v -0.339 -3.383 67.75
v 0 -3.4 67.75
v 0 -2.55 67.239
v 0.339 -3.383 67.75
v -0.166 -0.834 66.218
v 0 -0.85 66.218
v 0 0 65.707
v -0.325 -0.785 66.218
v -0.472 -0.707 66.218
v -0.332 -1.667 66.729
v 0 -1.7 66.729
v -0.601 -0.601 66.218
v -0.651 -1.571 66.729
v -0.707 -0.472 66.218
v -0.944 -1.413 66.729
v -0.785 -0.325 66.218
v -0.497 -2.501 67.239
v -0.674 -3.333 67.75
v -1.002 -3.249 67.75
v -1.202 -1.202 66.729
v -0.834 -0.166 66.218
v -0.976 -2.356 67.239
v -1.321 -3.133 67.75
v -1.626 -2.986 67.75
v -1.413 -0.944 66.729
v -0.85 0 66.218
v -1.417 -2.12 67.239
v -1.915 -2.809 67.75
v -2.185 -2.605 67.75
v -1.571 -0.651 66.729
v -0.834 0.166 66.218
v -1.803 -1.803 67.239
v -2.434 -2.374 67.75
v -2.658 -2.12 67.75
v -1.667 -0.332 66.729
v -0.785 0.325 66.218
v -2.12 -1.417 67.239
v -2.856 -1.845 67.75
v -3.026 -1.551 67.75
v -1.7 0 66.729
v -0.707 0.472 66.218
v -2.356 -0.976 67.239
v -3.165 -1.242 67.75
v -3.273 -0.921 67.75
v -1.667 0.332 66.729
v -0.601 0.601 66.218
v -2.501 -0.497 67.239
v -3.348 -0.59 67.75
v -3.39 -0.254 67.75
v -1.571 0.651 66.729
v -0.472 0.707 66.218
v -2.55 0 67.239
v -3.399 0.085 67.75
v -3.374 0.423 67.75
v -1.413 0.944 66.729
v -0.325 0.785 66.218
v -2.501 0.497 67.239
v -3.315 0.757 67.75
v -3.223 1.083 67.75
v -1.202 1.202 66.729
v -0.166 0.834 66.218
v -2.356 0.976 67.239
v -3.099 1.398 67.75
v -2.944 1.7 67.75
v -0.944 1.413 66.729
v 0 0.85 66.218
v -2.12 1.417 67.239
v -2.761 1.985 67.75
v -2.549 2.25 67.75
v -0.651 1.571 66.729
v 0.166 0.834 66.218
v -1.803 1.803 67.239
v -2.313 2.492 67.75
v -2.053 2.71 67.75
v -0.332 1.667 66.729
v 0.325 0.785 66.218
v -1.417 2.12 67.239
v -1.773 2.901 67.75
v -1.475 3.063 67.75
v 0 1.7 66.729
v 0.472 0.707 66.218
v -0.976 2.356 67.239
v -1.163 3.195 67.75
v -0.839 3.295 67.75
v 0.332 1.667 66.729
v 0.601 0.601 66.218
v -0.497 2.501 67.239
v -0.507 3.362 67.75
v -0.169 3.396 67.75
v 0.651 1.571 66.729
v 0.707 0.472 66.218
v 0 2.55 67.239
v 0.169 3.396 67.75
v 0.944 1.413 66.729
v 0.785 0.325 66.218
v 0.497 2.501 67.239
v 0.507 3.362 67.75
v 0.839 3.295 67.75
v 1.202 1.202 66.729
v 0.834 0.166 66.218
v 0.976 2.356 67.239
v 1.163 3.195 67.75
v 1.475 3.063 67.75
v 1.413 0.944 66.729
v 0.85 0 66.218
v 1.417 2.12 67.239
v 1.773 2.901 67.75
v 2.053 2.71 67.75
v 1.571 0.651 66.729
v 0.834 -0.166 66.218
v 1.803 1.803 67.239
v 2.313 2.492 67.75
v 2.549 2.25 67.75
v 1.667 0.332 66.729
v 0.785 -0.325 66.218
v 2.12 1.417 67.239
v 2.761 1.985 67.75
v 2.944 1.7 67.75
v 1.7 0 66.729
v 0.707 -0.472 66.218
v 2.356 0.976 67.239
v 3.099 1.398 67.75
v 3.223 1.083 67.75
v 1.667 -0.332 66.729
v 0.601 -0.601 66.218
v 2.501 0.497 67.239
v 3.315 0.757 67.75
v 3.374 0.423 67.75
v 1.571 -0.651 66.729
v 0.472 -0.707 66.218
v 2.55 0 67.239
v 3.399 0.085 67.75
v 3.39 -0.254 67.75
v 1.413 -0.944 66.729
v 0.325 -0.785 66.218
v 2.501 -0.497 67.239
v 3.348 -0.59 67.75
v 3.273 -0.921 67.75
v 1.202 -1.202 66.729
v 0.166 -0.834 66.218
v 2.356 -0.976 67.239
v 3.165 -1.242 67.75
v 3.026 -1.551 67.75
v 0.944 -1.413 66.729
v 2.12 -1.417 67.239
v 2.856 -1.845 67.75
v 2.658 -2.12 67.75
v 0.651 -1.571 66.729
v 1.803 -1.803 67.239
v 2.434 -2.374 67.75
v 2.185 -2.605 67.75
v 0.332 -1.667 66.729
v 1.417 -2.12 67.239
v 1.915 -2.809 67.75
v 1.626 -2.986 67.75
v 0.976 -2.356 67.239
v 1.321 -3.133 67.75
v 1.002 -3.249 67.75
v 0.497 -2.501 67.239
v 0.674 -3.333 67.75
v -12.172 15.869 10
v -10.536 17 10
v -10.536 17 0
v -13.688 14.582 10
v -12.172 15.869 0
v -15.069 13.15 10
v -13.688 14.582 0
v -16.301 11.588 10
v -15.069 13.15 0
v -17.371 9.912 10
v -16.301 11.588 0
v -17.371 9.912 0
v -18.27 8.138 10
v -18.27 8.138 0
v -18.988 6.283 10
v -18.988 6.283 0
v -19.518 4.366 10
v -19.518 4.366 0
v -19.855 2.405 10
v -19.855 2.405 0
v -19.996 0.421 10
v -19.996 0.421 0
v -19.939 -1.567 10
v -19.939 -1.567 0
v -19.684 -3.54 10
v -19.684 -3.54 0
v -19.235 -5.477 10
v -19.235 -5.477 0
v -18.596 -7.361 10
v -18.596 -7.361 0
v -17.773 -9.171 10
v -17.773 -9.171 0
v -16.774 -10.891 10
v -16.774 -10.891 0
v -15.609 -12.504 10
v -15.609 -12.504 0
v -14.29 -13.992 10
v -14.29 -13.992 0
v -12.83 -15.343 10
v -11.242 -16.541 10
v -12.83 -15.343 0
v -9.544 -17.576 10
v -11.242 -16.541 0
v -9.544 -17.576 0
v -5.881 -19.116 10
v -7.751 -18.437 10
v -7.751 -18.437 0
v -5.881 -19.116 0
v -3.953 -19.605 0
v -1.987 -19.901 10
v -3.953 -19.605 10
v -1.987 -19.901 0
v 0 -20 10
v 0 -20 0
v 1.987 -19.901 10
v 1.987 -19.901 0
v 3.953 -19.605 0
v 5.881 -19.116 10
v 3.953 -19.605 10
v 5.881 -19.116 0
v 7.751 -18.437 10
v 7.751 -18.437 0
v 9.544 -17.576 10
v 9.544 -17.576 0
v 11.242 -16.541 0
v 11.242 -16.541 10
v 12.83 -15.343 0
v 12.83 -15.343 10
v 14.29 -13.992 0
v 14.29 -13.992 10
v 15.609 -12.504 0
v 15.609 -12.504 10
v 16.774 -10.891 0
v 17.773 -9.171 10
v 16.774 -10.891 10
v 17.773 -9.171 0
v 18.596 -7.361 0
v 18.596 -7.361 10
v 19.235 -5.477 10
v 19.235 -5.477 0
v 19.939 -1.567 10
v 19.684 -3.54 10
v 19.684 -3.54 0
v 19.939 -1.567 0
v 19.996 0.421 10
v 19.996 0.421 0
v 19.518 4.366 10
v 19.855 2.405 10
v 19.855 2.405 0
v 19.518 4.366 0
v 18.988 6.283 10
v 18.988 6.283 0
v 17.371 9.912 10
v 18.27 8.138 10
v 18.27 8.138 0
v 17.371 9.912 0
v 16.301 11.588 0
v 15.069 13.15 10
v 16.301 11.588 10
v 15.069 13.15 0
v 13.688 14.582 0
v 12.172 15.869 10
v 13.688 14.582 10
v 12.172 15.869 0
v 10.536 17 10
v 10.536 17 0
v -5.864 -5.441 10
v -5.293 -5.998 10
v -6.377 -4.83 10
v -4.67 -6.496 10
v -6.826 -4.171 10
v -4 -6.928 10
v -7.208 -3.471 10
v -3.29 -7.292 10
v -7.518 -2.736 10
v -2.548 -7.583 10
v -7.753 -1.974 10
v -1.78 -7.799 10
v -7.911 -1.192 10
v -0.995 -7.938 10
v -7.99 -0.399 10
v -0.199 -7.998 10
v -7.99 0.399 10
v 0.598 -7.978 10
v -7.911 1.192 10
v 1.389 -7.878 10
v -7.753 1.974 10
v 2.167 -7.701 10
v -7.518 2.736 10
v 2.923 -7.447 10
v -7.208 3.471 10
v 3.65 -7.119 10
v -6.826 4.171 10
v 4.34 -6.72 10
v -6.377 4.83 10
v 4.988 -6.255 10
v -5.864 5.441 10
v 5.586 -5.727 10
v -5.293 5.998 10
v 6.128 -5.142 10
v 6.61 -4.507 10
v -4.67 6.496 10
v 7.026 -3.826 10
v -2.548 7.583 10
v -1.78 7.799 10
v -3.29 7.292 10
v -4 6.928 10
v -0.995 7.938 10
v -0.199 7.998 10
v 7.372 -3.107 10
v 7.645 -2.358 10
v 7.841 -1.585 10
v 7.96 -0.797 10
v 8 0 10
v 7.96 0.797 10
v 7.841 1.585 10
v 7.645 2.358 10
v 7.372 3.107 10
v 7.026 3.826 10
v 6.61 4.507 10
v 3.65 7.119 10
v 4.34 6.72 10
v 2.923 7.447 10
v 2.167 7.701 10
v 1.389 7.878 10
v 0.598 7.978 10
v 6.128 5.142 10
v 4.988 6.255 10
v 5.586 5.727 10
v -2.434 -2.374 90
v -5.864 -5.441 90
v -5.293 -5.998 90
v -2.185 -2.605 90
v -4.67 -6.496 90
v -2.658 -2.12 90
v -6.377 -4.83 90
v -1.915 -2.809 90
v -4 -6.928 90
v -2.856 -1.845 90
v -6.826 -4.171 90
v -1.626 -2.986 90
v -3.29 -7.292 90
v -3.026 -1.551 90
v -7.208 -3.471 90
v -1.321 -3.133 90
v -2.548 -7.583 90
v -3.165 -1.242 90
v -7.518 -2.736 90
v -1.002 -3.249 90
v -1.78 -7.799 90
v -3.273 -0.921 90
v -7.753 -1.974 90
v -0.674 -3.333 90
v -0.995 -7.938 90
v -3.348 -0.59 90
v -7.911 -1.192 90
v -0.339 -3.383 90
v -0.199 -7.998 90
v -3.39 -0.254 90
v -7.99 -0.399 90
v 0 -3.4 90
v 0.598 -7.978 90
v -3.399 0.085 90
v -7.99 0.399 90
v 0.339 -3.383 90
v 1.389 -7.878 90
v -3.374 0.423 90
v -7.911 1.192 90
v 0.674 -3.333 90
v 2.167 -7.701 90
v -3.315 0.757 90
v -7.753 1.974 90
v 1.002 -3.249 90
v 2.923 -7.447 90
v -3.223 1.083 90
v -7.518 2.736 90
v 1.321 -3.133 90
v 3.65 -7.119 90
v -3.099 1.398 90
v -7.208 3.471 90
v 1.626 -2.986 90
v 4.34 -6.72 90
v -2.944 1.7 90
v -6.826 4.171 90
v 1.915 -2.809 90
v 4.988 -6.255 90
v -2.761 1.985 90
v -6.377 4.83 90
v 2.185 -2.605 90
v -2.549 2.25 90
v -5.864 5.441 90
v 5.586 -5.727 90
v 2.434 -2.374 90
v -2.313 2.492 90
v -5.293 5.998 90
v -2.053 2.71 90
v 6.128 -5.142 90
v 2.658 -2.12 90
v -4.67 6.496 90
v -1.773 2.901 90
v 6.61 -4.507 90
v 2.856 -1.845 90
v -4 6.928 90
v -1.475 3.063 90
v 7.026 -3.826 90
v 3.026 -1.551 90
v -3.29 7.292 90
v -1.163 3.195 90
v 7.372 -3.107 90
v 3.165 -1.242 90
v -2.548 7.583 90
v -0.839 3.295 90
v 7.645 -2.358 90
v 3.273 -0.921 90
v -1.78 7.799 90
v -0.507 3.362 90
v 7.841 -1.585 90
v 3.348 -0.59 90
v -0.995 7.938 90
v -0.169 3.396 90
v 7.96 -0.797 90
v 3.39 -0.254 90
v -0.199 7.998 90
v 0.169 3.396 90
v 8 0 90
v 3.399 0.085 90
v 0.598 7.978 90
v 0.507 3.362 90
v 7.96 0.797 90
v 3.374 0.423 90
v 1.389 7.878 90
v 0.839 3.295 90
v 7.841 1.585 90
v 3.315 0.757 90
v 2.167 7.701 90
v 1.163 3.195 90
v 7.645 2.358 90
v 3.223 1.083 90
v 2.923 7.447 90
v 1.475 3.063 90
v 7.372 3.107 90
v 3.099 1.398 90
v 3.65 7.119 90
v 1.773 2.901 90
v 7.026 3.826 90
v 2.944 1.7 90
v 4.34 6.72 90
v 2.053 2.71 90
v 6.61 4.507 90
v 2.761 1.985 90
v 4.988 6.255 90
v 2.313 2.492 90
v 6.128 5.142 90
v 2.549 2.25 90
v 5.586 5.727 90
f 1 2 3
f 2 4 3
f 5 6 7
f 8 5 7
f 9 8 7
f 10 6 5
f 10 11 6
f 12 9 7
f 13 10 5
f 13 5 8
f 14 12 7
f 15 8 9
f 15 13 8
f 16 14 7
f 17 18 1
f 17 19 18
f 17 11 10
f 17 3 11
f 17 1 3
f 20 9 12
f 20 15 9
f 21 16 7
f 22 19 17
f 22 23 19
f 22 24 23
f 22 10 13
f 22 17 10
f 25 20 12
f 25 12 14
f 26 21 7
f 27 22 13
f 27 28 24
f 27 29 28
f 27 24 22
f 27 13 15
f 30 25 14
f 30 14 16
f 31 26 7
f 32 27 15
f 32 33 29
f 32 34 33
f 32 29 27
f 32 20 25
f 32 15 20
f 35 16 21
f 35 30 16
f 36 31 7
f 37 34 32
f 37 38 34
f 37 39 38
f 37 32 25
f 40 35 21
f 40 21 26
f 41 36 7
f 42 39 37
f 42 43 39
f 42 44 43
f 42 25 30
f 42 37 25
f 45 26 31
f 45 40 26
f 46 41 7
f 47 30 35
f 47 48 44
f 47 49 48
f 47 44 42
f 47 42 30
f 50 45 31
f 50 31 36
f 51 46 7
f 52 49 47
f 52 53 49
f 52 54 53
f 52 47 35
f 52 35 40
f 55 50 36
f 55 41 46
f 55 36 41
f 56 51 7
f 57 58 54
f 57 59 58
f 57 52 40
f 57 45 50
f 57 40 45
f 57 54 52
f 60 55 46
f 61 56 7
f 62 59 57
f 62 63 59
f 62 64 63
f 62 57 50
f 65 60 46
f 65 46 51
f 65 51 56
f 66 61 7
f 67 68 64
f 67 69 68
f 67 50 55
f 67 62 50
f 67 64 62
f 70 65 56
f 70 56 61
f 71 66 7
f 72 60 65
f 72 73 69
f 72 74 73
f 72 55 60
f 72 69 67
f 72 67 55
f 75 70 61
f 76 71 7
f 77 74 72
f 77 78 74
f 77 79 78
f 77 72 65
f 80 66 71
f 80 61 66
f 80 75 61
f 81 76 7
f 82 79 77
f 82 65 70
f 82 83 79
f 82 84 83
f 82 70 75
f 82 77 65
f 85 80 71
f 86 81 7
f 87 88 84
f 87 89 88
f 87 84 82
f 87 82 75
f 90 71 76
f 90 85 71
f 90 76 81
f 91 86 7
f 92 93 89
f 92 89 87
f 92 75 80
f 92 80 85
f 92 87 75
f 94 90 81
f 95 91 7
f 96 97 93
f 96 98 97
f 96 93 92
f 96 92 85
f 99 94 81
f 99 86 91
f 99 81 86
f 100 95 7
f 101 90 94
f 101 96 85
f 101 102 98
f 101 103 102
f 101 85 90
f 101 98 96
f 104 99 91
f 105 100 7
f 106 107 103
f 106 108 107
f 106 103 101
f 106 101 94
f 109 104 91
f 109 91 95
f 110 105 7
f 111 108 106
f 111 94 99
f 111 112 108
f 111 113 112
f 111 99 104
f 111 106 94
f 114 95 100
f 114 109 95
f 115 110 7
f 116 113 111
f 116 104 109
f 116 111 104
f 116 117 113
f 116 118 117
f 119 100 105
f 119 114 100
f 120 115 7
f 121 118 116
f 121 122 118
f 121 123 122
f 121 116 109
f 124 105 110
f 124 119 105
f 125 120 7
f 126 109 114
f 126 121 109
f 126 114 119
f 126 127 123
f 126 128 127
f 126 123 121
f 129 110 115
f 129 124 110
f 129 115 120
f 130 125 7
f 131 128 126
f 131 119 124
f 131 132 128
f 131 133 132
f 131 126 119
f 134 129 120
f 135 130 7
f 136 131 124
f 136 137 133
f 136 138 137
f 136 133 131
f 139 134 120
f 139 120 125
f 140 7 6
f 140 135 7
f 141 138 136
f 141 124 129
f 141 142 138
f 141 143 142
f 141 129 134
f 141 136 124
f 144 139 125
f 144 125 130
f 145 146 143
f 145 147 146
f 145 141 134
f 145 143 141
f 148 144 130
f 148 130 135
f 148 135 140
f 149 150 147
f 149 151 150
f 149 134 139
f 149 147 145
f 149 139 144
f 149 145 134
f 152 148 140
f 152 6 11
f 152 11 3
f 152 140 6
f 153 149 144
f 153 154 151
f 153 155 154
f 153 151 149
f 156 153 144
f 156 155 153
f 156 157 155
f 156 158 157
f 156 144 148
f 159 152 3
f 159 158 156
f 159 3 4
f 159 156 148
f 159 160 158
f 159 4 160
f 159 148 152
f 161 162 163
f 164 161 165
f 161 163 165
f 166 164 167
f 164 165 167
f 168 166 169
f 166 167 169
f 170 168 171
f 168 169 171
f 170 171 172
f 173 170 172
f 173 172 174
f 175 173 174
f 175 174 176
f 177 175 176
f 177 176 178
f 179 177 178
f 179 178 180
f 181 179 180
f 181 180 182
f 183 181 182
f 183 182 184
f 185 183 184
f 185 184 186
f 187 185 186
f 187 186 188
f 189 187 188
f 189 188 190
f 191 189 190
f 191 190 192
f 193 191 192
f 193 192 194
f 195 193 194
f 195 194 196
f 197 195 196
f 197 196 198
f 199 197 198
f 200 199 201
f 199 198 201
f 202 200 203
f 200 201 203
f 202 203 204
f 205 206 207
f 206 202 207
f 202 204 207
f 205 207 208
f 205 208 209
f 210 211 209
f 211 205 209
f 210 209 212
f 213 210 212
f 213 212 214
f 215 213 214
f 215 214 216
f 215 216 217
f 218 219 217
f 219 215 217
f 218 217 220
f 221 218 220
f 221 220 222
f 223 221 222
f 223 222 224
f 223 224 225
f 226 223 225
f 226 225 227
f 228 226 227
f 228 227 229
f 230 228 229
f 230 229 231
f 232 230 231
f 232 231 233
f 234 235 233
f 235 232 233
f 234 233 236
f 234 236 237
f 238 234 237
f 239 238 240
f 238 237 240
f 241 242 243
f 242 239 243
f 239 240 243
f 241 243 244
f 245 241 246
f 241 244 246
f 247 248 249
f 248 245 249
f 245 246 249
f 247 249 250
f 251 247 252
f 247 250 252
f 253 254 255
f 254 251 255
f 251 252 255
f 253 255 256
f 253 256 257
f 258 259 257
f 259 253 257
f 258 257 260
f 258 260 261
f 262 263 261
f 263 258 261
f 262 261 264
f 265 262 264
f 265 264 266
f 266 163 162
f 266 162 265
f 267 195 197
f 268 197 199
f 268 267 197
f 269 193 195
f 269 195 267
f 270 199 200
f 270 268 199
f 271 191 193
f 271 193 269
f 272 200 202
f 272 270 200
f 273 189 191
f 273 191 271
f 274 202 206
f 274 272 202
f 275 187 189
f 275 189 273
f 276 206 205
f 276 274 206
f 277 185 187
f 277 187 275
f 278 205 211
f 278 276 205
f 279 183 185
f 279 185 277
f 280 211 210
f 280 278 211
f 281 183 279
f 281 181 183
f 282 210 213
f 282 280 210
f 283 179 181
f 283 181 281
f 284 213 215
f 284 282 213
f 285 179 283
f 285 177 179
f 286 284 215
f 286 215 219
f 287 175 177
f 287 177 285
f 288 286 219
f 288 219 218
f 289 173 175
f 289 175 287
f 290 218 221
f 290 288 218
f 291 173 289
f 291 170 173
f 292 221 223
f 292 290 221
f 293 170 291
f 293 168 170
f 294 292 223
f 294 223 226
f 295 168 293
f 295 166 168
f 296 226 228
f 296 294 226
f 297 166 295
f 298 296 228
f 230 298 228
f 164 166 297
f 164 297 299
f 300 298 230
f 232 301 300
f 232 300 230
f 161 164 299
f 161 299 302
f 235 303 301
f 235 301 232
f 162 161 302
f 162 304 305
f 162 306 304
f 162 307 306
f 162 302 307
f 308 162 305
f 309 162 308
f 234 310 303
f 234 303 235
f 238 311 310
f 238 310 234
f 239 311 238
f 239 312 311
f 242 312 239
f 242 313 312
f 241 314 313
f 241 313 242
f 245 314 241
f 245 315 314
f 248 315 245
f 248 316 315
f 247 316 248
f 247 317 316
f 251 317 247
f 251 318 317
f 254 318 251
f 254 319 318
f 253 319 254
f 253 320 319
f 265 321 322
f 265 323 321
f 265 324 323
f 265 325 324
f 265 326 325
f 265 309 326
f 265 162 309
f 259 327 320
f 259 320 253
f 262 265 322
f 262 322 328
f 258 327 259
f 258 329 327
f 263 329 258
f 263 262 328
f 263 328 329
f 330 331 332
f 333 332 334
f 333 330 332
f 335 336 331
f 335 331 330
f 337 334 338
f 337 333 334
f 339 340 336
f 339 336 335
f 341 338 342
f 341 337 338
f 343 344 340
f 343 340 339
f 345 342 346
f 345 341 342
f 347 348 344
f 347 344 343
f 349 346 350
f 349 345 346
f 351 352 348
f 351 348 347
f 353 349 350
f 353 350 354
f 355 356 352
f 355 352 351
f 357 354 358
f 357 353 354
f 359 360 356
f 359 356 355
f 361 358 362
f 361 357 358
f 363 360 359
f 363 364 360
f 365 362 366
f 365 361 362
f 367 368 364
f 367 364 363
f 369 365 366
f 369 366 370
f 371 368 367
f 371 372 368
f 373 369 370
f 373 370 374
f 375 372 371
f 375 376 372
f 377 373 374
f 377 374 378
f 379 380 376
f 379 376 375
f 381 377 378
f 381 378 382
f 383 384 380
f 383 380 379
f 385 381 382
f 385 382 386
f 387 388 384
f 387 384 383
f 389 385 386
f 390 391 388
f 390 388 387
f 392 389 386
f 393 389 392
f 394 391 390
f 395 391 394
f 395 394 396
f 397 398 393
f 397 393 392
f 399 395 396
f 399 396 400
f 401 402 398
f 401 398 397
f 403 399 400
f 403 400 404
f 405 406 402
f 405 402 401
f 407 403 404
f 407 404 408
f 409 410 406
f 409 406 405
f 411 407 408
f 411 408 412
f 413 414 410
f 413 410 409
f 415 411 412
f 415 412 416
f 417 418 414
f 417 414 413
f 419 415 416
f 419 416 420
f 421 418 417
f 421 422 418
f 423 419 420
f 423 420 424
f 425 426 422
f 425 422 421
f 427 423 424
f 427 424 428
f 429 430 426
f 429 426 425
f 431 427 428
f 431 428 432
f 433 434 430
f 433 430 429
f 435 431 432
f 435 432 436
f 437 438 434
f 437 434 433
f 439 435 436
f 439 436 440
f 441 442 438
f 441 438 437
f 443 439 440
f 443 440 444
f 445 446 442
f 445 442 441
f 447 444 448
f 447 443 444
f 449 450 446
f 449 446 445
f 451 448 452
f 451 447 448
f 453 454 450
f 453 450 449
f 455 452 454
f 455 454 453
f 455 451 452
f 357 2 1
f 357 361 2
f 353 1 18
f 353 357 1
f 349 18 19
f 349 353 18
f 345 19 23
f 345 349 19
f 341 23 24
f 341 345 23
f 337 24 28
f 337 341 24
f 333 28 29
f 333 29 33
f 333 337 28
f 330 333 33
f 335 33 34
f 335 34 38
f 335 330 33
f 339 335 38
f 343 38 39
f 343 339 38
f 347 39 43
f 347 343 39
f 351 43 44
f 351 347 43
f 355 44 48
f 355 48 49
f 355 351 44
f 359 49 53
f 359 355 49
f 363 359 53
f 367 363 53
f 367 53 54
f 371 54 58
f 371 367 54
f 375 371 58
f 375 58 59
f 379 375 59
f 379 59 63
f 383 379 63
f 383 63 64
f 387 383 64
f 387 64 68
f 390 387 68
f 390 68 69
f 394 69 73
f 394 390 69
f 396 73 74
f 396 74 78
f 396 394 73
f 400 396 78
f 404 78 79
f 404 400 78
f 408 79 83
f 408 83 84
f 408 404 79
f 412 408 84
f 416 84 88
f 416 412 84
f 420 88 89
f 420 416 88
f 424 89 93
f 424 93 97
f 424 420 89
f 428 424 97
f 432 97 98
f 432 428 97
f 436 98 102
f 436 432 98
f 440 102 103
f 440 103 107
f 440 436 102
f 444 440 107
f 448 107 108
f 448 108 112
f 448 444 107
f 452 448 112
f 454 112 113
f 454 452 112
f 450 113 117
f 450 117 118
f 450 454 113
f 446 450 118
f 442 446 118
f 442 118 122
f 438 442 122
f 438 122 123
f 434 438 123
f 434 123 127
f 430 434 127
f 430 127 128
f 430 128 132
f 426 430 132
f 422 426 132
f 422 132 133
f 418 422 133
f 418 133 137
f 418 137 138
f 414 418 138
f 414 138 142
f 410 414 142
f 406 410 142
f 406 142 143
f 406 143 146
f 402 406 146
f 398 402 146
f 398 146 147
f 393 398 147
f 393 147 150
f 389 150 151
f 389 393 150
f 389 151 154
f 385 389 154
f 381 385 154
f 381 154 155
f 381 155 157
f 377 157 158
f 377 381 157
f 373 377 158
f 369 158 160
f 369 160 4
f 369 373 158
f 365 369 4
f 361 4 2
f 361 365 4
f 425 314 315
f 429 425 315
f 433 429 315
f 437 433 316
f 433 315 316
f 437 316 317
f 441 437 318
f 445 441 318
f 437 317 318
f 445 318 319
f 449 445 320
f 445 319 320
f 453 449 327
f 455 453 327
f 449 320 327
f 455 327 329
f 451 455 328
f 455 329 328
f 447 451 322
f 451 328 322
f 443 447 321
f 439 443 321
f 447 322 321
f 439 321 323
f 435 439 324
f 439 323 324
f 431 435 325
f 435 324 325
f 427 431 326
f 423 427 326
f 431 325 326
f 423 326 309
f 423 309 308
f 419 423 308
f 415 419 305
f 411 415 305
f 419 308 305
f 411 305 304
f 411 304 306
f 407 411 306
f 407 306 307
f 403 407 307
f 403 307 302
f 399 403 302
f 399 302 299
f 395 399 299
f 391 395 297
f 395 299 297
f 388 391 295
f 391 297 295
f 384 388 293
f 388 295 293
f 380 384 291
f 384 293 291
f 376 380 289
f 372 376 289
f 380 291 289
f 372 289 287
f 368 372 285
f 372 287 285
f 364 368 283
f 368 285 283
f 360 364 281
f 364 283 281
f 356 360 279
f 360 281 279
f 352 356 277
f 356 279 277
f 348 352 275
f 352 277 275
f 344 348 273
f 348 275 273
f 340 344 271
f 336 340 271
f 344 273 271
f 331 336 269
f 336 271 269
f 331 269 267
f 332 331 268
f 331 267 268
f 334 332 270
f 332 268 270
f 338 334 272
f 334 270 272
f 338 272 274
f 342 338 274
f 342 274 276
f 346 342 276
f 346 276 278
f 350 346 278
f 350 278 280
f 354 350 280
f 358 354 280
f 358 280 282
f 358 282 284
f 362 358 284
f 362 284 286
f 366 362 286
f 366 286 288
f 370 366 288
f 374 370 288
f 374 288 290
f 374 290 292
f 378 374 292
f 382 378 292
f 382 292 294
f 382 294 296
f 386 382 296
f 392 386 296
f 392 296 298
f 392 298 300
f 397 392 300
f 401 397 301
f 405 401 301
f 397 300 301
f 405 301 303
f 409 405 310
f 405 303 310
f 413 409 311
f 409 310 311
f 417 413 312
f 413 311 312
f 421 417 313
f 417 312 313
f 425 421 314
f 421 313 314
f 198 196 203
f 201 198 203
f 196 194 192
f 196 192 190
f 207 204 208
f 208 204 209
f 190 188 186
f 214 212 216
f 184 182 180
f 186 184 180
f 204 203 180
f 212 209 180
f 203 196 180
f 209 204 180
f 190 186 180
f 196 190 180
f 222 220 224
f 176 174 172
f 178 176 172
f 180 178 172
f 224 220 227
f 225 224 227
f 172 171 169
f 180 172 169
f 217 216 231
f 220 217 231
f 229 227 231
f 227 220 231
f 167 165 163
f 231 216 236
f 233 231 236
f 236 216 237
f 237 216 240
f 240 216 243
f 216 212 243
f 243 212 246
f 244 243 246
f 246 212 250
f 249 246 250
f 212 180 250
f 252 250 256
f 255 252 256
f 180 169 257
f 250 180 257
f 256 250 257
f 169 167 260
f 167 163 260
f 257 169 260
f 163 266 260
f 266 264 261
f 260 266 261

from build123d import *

# Parameters (mm, degrees)
ESQUISSE1_R             = 20
BOSS_EXTRU_1_DEPTH      = 10
ESQUISSE2_R             = 8
BOSS_EXTRU_2_DEPTH      = 80
ESQUISSE3_W             = 36.346174344
ESQUISSE3_H             = 6
ENL_V_MAT_EXTRU_3_DEPTH = 41


with BuildPart() as part:
    # Esquisse1 → Boss.-Extru.1 (new body)
    with BuildSketch(Plane.XY):
        Circle(ESQUISSE1_R)
    extrude(amount=BOSS_EXTRU_1_DEPTH)

    # Esquisse2 → Boss.-Extru.2 (add)
    with BuildSketch(Plane.XY.offset(10)):
        Circle(ESQUISSE2_R)
    extrude(amount=BOSS_EXTRU_2_DEPTH)

    # Esquisse3 → Enlèv. mat.-Extru.3 (cut)
    with BuildSketch(Plane.XY):
        with Locations((0, 20)):
            Rectangle(ESQUISSE3_W, ESQUISSE3_H)
    extrude(amount=ENL_V_MAT_EXTRU_3_DEPTH, mode=Mode.SUBTRACT)

    # Esquisse5 → Trou taraudé M81 (revolve, cut)
    with BuildSketch(Plane(origin=(0, 0, 90), x_dir=(0, -1, 0), z_dir=(1, 0, 0))):
        Polygon((0, 0), (0, 24.292926105), (3.4, 22.25), (3.4, 0), align=None)
    revolve(axis=Axis((0, 0, 96.35), (0, 0, -1)), mode=Mode.SUBTRACT)


solid = part.part
